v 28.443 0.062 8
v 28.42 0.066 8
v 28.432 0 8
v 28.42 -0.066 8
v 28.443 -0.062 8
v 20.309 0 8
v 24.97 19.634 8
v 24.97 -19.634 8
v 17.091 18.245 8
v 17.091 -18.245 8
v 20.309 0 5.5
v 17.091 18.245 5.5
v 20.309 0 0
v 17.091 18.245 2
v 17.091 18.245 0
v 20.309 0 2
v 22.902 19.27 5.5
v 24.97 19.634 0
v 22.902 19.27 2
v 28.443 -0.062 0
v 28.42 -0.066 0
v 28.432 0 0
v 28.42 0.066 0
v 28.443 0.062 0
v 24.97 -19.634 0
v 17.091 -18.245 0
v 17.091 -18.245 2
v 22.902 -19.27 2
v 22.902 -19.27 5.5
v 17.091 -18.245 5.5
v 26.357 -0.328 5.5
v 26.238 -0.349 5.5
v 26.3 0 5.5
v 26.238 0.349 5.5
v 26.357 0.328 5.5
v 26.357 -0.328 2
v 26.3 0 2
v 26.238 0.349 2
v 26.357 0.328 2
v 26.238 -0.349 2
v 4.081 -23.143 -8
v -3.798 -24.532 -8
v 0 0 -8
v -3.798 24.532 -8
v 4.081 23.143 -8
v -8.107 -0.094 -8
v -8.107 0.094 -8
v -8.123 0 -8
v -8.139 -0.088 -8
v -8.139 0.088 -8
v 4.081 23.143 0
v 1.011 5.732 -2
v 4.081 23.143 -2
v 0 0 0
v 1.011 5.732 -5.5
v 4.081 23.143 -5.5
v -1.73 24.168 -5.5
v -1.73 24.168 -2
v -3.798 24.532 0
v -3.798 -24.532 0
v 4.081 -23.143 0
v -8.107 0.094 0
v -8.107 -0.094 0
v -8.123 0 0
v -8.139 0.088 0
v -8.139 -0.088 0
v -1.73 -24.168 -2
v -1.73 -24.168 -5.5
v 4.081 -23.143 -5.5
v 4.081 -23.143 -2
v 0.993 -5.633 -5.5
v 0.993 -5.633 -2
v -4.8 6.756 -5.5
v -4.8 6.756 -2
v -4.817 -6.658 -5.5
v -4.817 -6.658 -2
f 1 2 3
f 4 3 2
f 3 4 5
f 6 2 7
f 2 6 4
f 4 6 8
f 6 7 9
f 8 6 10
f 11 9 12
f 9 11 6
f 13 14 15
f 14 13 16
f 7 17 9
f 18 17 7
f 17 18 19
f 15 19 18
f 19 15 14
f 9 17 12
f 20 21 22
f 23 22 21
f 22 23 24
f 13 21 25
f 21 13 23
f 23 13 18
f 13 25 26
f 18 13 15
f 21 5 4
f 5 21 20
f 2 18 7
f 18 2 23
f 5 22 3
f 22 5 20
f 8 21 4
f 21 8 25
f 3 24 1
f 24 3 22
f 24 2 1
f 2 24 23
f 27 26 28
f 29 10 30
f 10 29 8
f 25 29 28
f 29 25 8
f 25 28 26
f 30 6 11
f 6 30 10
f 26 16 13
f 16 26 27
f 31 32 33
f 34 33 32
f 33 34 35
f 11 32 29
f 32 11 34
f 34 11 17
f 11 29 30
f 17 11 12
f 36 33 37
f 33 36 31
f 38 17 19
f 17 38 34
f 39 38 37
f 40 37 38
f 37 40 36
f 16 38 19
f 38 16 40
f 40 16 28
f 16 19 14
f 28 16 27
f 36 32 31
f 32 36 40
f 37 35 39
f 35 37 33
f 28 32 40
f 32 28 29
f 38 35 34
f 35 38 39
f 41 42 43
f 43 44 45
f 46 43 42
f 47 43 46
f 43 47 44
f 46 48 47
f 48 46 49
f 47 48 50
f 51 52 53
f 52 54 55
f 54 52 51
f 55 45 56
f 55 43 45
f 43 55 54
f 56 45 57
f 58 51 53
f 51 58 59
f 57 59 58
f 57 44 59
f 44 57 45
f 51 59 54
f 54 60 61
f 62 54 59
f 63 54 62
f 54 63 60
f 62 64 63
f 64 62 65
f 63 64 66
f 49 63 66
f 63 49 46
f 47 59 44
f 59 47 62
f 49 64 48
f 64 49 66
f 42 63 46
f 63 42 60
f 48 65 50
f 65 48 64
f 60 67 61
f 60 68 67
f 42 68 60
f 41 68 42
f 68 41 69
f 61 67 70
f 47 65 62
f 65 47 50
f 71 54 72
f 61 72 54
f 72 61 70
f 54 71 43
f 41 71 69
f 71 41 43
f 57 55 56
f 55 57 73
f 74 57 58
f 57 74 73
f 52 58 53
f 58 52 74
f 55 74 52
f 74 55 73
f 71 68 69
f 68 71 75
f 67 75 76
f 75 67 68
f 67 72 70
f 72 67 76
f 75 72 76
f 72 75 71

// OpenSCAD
width=55;
bottomWidth=69.459;
height=110;
thick=4;
outerRadius=200;
cellRadius=200-thick-3;
innerRadius=158.366;

Height_ha = 114.17831;
Height_hb = 185.53975;
Height_hc = 114.17831;

leanAngle=90-72.08;
topAngle = 7.53 / 2;

module topClip(y) {
    difference() {
        union(){
            rotate([0,0,10]) translate([20,-5,0]) cube([8,20,8]);
            rotate([0,0,170]) translate([-28,-5,0]) cube([8,20,8]);
        }
        union(){
            rotate([0,0,10]) translate([20-0.1,-4.9,2]) cube([6,20,3.5]);
            rotate([0,0,170]) translate([-28+2.1,-4.9,2]) cube([6,20,3.5]);
        }
    }
}

module bottomClip(y) {
    difference() {
        union(){
            rotate([0,0,10]) translate([y,-1.5,0]) cube([8,25,8]);
            rotate([0,0,170]) translate([y-8,-1.5,0]) cube([8,25,8]);
        }
        union(){
            rotate([0,0,10]) translate([y-0.1,-1.4+7.22,2]) cube([6,25,3.5]);
            rotate([0,0,170]) translate([y-8+2.1,-1.5+7.22,2]) cube([6,25,3.5]);
        }
    }
}



module clips() {
    topClip();
    rotate([0,180,0]) bottomClip(0);
}

clips();
